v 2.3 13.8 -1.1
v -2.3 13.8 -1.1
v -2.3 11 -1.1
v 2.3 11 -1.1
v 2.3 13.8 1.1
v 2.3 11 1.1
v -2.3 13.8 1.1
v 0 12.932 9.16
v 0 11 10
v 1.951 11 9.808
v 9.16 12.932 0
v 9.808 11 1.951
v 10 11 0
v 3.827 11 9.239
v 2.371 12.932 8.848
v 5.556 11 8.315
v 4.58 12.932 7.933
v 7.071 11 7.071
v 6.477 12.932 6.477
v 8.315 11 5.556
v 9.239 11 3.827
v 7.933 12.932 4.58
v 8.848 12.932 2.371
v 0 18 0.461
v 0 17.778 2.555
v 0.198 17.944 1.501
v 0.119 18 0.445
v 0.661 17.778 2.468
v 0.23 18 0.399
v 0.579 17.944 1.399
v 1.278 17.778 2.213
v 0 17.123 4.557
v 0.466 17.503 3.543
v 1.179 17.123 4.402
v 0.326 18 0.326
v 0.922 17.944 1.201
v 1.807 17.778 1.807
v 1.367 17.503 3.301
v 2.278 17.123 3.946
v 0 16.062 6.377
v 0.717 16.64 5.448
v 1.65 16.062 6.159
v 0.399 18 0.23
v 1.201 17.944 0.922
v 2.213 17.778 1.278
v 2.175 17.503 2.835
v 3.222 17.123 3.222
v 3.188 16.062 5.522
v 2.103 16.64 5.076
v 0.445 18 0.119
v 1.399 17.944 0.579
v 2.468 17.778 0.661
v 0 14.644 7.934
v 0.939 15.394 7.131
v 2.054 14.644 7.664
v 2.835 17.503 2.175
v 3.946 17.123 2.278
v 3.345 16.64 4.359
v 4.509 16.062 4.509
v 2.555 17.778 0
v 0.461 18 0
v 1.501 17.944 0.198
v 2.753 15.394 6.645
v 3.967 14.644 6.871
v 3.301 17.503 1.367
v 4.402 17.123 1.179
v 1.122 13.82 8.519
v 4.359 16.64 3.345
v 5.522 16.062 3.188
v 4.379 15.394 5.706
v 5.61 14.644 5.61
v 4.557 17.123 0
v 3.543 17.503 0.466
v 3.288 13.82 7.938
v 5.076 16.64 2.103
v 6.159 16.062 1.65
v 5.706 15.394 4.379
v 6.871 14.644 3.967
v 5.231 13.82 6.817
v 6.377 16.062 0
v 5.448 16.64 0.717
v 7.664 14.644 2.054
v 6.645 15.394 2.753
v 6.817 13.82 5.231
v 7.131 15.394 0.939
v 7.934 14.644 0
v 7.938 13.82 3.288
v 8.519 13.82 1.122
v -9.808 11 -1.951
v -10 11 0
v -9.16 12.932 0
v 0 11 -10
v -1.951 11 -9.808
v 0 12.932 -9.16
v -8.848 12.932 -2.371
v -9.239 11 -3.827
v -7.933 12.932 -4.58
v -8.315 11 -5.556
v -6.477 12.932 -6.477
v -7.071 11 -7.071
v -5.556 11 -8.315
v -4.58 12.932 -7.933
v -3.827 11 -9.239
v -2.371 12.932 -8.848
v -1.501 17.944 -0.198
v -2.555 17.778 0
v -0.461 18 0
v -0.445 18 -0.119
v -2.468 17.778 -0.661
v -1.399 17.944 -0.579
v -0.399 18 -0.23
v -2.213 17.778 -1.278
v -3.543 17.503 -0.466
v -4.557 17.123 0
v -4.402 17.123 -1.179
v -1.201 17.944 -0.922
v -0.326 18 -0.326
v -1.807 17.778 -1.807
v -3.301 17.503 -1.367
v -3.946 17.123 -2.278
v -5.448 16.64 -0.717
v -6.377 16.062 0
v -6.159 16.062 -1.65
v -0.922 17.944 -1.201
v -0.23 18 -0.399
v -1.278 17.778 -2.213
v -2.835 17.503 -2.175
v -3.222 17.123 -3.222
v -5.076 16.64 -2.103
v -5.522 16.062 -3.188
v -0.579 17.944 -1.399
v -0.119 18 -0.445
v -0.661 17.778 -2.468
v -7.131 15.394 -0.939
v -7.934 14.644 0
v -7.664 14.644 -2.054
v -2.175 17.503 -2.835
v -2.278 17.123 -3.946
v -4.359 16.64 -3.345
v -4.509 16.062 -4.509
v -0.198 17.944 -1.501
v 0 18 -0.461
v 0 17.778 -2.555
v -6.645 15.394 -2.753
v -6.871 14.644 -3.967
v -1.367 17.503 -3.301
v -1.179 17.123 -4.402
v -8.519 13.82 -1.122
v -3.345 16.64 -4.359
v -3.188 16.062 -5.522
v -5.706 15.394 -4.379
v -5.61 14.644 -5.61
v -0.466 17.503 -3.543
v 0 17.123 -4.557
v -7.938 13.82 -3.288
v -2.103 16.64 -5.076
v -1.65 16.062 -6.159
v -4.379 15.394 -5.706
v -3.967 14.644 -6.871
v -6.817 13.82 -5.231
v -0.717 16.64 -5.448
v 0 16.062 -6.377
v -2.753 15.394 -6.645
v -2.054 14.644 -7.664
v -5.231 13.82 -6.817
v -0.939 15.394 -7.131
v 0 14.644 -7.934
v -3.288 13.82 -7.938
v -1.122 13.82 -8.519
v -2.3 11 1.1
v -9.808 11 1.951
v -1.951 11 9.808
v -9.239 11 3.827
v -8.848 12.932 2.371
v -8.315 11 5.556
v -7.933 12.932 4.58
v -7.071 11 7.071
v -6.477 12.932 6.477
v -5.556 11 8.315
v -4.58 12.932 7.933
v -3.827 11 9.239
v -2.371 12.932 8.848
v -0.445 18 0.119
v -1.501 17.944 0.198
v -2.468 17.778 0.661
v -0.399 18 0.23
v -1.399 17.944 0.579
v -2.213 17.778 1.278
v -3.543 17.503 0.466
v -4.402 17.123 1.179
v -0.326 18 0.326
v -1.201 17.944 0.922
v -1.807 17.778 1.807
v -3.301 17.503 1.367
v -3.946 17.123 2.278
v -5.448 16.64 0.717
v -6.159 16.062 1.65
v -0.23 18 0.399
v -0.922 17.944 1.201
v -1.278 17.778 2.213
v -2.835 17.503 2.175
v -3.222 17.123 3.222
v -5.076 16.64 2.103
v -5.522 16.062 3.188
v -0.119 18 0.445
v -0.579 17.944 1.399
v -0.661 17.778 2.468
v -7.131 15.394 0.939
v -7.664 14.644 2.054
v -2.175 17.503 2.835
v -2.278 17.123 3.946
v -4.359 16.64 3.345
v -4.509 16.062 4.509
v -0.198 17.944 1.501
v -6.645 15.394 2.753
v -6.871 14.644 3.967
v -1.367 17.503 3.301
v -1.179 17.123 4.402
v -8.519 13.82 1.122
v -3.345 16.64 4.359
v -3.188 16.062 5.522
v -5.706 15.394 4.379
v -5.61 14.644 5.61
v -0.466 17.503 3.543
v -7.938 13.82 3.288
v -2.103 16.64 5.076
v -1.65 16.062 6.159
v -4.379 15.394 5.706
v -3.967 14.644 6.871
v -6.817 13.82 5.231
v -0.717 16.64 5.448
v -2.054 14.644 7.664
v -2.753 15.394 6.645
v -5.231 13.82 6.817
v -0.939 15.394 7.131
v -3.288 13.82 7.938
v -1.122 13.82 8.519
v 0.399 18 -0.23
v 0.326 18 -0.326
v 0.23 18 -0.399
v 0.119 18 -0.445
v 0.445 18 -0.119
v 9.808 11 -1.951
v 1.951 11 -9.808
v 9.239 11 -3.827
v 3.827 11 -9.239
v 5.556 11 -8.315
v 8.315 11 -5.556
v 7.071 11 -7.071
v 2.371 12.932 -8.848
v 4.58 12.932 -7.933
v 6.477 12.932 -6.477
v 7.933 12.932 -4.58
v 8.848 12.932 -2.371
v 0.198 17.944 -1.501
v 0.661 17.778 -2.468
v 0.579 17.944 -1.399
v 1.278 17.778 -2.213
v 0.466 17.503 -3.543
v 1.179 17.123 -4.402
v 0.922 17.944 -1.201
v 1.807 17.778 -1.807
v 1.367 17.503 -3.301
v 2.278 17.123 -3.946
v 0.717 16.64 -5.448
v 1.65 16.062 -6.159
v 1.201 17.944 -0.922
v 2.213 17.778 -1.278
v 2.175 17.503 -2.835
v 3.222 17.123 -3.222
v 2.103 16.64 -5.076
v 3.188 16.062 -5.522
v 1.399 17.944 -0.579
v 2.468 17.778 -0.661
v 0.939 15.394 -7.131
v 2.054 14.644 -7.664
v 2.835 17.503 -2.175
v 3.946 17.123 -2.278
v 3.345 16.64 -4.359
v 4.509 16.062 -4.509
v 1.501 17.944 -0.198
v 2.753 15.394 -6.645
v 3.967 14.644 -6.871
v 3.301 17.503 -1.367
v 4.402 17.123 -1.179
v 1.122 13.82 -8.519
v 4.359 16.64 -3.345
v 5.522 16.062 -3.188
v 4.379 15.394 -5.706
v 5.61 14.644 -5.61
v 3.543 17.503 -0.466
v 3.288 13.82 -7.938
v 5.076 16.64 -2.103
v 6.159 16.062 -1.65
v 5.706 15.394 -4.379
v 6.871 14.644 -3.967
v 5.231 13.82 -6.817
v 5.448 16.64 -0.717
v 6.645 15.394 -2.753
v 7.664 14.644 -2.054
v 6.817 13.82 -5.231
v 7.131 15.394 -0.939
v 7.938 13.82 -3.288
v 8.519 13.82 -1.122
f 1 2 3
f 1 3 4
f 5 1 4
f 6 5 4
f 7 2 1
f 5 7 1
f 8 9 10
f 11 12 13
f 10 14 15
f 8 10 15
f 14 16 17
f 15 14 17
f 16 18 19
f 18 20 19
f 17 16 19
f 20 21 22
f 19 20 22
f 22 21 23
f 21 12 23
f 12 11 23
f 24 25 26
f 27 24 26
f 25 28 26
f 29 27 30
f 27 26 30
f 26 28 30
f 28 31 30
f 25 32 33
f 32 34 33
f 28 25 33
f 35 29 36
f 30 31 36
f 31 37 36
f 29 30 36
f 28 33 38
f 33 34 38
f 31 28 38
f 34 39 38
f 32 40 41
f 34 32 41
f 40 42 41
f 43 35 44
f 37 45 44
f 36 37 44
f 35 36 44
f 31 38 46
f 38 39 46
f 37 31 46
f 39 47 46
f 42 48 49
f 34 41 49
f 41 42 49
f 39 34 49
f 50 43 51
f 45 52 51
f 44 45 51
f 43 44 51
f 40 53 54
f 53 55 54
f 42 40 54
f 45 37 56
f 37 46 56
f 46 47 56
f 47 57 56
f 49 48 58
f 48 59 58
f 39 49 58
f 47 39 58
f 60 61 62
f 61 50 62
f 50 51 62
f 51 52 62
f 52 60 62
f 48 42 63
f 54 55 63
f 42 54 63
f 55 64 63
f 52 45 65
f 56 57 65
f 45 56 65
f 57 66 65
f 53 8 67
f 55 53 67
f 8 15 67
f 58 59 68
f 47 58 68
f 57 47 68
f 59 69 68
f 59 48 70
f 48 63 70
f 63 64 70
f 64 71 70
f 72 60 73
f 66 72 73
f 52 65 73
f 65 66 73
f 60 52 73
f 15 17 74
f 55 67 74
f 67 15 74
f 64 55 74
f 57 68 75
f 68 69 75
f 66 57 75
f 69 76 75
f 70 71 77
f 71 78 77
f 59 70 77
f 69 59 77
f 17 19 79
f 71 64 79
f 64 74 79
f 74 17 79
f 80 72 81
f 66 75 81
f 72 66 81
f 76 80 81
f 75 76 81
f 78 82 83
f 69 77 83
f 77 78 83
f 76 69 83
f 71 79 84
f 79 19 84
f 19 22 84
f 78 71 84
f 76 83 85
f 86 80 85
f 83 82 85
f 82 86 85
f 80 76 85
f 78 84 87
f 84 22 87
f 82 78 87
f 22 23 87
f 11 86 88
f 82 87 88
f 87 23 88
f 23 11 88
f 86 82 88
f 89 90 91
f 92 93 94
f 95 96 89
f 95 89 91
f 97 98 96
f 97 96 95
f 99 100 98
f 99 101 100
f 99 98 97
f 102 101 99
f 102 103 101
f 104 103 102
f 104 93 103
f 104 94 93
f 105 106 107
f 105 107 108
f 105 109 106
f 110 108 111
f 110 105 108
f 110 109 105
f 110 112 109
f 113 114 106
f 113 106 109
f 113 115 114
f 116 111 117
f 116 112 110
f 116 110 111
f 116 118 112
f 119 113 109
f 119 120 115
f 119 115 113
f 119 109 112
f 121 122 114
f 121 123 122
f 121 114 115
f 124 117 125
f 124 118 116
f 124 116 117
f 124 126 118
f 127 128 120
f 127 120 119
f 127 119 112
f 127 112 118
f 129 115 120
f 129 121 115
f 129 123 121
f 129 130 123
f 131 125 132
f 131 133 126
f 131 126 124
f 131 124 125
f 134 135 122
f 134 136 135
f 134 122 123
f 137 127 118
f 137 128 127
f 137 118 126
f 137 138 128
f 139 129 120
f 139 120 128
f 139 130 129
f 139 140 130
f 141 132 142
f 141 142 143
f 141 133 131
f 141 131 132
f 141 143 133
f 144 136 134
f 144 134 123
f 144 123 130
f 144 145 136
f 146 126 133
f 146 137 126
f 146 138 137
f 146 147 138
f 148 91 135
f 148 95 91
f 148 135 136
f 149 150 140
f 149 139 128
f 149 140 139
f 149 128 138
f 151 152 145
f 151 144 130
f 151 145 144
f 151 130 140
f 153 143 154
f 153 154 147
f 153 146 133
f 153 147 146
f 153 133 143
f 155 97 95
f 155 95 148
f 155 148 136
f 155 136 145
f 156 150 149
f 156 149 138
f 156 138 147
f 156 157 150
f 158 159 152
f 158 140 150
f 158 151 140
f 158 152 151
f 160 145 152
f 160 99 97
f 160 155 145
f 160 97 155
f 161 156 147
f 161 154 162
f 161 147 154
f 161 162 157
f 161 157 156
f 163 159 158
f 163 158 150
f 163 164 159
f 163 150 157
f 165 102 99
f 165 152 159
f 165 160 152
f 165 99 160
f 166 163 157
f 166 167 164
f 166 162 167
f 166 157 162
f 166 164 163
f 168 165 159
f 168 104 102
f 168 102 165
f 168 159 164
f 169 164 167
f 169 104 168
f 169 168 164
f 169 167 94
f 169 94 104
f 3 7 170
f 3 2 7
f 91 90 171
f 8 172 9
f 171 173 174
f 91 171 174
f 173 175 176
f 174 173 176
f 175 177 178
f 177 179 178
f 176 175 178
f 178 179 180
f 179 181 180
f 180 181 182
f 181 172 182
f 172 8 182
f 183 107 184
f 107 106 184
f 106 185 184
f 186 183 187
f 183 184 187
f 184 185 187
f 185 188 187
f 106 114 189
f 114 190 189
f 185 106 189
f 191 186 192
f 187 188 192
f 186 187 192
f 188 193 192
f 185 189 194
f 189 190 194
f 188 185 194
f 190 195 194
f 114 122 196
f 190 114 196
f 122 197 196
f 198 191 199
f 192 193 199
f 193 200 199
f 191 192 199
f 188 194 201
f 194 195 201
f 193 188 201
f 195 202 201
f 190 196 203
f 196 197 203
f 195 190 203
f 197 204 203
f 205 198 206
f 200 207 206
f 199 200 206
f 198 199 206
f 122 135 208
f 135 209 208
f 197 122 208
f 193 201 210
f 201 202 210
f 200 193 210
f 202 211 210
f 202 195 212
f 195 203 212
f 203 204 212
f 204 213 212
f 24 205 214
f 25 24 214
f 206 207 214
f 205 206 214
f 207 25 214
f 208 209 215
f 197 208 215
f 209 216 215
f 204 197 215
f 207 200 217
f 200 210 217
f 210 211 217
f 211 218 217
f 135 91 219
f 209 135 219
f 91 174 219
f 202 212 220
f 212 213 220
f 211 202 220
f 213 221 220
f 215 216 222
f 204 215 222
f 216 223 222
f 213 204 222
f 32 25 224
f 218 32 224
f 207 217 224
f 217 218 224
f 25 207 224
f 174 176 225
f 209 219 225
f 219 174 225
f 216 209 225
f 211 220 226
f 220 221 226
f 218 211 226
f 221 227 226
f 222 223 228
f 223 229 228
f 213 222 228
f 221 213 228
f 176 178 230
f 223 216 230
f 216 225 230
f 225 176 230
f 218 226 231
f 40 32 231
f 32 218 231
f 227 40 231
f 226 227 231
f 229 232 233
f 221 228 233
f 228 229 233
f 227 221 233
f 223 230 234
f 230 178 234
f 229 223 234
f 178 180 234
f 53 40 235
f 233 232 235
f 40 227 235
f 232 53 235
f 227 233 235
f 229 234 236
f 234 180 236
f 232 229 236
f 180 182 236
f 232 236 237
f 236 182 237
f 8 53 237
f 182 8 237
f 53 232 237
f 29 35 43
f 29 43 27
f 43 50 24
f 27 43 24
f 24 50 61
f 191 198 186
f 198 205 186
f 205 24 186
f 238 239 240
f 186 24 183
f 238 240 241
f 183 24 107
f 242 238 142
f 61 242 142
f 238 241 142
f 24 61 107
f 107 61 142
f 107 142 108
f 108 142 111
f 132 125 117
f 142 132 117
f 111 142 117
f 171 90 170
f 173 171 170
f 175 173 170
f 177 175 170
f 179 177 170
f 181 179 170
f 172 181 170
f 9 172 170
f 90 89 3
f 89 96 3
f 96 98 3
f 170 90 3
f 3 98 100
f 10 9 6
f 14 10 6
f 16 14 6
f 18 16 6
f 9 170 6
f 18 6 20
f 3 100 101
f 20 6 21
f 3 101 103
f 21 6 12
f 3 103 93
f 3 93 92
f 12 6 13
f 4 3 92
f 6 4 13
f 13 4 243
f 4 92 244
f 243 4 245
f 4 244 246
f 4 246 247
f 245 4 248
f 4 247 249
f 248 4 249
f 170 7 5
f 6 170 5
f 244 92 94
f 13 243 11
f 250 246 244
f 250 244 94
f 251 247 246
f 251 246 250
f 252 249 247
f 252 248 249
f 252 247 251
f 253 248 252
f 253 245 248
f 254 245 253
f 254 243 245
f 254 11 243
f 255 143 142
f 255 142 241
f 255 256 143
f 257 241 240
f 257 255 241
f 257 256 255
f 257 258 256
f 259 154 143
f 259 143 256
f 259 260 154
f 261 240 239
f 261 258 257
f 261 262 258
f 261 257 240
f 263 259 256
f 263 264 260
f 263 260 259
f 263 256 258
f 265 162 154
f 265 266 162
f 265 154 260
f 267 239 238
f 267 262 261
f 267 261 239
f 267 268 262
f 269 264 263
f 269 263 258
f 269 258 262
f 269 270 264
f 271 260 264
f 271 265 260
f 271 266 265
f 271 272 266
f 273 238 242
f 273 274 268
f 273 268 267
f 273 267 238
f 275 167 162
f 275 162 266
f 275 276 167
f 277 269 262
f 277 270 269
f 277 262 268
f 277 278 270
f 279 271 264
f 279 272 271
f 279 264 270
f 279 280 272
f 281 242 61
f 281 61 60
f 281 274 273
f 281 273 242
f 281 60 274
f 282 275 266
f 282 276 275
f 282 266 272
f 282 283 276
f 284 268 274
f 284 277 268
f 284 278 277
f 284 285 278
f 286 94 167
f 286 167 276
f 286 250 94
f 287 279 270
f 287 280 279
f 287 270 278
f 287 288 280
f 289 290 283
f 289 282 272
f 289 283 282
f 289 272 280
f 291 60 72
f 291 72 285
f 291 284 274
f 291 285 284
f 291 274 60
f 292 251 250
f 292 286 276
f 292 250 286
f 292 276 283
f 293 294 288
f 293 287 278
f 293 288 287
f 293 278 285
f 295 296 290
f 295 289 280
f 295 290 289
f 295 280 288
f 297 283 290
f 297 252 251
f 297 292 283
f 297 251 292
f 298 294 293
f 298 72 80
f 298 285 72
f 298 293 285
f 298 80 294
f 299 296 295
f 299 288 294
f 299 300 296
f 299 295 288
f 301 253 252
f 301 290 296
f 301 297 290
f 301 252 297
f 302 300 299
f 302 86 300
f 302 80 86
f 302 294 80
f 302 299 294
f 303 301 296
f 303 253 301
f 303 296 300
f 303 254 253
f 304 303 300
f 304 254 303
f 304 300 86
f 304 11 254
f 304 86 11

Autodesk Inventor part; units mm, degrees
ref_plane "YZ Plane" through (0, 0, 0) normal (1, 0, 0) x (0, 1, 0)
ref_plane "XZ Plane" through (0, 0, 0) normal (0, 1, 0) x (-1, 0, 0)
ref_plane "XY Plane" through (0, 0, 0) normal (0, 0, 1) x (1, 0, 0)
sketch "スケッチ1" plane through (0, 0, 0) normal (0, 0, 1) x (1, 0, 0)
  line L0 (2, 8) -> (-2, 8) construction
  line L1 (2, 8) -> (2, 13.5) construction
  line L2 (-2, 13.5) -> (2, 13.5) construction
  line L3 (-2, 8) -> (-2, 13.5) construction
  line L4 (-10, 8) -> (10, 8)
  line L5 (10, 8) -> (10, 18)
  line L6 (10, 18) -> (-10, 18)
  line L7 (-10, 18) -> (-10, 8)
  line L8 (0, -3.6) -> (0, 21.6) construction
  line L9 (-2.3, 13.8) -> (-2.3, 8)
  line L10 (-2.3, 13.8) -> (2.3, 13.8)
  line L11 (2.3, 13.8) -> (2.3, 8)
  line L12 (-10, 11) -> (10, 11)
  line L13 (-10, 14.5) -> (10, 14.5) construction
  point P0 (0, 0)
  point P1 (0, 18)
  point P2 (-2.3, 11)
  point P3 (2.3, 11)
  dimension "d0" = 20
  dimension "d1" = 10
  dimension "d2" = 0.3
  dimension "d3" = 0.3
  dimension "d4" = 0.3
  dimension "d5" = 3
  dimension "d6" = 3.5
extrude "押し出し1" add sketch "スケッチ1" along normal mid plane 20 contours L7 L6 L5 L12 L11 L10 L9 | L9 L10 L11 L12
extrude "押し出し2" cut sketch "スケッチ1" along normal mid plane 2.2 contours L9 L10 L11 L12
fillet "フィレット1" radius 10 4 edges at (-10, 14.5, 10) (-10, 14.5, -10) (10, 14.5, -10) (10, 14.5, 10)
fillet "フィレット2" radius 10 3 edges at (0, 18, 10) (-7.0711, 18, 7.0711) (-10, 18, 0)
properties part number "nob_L"
